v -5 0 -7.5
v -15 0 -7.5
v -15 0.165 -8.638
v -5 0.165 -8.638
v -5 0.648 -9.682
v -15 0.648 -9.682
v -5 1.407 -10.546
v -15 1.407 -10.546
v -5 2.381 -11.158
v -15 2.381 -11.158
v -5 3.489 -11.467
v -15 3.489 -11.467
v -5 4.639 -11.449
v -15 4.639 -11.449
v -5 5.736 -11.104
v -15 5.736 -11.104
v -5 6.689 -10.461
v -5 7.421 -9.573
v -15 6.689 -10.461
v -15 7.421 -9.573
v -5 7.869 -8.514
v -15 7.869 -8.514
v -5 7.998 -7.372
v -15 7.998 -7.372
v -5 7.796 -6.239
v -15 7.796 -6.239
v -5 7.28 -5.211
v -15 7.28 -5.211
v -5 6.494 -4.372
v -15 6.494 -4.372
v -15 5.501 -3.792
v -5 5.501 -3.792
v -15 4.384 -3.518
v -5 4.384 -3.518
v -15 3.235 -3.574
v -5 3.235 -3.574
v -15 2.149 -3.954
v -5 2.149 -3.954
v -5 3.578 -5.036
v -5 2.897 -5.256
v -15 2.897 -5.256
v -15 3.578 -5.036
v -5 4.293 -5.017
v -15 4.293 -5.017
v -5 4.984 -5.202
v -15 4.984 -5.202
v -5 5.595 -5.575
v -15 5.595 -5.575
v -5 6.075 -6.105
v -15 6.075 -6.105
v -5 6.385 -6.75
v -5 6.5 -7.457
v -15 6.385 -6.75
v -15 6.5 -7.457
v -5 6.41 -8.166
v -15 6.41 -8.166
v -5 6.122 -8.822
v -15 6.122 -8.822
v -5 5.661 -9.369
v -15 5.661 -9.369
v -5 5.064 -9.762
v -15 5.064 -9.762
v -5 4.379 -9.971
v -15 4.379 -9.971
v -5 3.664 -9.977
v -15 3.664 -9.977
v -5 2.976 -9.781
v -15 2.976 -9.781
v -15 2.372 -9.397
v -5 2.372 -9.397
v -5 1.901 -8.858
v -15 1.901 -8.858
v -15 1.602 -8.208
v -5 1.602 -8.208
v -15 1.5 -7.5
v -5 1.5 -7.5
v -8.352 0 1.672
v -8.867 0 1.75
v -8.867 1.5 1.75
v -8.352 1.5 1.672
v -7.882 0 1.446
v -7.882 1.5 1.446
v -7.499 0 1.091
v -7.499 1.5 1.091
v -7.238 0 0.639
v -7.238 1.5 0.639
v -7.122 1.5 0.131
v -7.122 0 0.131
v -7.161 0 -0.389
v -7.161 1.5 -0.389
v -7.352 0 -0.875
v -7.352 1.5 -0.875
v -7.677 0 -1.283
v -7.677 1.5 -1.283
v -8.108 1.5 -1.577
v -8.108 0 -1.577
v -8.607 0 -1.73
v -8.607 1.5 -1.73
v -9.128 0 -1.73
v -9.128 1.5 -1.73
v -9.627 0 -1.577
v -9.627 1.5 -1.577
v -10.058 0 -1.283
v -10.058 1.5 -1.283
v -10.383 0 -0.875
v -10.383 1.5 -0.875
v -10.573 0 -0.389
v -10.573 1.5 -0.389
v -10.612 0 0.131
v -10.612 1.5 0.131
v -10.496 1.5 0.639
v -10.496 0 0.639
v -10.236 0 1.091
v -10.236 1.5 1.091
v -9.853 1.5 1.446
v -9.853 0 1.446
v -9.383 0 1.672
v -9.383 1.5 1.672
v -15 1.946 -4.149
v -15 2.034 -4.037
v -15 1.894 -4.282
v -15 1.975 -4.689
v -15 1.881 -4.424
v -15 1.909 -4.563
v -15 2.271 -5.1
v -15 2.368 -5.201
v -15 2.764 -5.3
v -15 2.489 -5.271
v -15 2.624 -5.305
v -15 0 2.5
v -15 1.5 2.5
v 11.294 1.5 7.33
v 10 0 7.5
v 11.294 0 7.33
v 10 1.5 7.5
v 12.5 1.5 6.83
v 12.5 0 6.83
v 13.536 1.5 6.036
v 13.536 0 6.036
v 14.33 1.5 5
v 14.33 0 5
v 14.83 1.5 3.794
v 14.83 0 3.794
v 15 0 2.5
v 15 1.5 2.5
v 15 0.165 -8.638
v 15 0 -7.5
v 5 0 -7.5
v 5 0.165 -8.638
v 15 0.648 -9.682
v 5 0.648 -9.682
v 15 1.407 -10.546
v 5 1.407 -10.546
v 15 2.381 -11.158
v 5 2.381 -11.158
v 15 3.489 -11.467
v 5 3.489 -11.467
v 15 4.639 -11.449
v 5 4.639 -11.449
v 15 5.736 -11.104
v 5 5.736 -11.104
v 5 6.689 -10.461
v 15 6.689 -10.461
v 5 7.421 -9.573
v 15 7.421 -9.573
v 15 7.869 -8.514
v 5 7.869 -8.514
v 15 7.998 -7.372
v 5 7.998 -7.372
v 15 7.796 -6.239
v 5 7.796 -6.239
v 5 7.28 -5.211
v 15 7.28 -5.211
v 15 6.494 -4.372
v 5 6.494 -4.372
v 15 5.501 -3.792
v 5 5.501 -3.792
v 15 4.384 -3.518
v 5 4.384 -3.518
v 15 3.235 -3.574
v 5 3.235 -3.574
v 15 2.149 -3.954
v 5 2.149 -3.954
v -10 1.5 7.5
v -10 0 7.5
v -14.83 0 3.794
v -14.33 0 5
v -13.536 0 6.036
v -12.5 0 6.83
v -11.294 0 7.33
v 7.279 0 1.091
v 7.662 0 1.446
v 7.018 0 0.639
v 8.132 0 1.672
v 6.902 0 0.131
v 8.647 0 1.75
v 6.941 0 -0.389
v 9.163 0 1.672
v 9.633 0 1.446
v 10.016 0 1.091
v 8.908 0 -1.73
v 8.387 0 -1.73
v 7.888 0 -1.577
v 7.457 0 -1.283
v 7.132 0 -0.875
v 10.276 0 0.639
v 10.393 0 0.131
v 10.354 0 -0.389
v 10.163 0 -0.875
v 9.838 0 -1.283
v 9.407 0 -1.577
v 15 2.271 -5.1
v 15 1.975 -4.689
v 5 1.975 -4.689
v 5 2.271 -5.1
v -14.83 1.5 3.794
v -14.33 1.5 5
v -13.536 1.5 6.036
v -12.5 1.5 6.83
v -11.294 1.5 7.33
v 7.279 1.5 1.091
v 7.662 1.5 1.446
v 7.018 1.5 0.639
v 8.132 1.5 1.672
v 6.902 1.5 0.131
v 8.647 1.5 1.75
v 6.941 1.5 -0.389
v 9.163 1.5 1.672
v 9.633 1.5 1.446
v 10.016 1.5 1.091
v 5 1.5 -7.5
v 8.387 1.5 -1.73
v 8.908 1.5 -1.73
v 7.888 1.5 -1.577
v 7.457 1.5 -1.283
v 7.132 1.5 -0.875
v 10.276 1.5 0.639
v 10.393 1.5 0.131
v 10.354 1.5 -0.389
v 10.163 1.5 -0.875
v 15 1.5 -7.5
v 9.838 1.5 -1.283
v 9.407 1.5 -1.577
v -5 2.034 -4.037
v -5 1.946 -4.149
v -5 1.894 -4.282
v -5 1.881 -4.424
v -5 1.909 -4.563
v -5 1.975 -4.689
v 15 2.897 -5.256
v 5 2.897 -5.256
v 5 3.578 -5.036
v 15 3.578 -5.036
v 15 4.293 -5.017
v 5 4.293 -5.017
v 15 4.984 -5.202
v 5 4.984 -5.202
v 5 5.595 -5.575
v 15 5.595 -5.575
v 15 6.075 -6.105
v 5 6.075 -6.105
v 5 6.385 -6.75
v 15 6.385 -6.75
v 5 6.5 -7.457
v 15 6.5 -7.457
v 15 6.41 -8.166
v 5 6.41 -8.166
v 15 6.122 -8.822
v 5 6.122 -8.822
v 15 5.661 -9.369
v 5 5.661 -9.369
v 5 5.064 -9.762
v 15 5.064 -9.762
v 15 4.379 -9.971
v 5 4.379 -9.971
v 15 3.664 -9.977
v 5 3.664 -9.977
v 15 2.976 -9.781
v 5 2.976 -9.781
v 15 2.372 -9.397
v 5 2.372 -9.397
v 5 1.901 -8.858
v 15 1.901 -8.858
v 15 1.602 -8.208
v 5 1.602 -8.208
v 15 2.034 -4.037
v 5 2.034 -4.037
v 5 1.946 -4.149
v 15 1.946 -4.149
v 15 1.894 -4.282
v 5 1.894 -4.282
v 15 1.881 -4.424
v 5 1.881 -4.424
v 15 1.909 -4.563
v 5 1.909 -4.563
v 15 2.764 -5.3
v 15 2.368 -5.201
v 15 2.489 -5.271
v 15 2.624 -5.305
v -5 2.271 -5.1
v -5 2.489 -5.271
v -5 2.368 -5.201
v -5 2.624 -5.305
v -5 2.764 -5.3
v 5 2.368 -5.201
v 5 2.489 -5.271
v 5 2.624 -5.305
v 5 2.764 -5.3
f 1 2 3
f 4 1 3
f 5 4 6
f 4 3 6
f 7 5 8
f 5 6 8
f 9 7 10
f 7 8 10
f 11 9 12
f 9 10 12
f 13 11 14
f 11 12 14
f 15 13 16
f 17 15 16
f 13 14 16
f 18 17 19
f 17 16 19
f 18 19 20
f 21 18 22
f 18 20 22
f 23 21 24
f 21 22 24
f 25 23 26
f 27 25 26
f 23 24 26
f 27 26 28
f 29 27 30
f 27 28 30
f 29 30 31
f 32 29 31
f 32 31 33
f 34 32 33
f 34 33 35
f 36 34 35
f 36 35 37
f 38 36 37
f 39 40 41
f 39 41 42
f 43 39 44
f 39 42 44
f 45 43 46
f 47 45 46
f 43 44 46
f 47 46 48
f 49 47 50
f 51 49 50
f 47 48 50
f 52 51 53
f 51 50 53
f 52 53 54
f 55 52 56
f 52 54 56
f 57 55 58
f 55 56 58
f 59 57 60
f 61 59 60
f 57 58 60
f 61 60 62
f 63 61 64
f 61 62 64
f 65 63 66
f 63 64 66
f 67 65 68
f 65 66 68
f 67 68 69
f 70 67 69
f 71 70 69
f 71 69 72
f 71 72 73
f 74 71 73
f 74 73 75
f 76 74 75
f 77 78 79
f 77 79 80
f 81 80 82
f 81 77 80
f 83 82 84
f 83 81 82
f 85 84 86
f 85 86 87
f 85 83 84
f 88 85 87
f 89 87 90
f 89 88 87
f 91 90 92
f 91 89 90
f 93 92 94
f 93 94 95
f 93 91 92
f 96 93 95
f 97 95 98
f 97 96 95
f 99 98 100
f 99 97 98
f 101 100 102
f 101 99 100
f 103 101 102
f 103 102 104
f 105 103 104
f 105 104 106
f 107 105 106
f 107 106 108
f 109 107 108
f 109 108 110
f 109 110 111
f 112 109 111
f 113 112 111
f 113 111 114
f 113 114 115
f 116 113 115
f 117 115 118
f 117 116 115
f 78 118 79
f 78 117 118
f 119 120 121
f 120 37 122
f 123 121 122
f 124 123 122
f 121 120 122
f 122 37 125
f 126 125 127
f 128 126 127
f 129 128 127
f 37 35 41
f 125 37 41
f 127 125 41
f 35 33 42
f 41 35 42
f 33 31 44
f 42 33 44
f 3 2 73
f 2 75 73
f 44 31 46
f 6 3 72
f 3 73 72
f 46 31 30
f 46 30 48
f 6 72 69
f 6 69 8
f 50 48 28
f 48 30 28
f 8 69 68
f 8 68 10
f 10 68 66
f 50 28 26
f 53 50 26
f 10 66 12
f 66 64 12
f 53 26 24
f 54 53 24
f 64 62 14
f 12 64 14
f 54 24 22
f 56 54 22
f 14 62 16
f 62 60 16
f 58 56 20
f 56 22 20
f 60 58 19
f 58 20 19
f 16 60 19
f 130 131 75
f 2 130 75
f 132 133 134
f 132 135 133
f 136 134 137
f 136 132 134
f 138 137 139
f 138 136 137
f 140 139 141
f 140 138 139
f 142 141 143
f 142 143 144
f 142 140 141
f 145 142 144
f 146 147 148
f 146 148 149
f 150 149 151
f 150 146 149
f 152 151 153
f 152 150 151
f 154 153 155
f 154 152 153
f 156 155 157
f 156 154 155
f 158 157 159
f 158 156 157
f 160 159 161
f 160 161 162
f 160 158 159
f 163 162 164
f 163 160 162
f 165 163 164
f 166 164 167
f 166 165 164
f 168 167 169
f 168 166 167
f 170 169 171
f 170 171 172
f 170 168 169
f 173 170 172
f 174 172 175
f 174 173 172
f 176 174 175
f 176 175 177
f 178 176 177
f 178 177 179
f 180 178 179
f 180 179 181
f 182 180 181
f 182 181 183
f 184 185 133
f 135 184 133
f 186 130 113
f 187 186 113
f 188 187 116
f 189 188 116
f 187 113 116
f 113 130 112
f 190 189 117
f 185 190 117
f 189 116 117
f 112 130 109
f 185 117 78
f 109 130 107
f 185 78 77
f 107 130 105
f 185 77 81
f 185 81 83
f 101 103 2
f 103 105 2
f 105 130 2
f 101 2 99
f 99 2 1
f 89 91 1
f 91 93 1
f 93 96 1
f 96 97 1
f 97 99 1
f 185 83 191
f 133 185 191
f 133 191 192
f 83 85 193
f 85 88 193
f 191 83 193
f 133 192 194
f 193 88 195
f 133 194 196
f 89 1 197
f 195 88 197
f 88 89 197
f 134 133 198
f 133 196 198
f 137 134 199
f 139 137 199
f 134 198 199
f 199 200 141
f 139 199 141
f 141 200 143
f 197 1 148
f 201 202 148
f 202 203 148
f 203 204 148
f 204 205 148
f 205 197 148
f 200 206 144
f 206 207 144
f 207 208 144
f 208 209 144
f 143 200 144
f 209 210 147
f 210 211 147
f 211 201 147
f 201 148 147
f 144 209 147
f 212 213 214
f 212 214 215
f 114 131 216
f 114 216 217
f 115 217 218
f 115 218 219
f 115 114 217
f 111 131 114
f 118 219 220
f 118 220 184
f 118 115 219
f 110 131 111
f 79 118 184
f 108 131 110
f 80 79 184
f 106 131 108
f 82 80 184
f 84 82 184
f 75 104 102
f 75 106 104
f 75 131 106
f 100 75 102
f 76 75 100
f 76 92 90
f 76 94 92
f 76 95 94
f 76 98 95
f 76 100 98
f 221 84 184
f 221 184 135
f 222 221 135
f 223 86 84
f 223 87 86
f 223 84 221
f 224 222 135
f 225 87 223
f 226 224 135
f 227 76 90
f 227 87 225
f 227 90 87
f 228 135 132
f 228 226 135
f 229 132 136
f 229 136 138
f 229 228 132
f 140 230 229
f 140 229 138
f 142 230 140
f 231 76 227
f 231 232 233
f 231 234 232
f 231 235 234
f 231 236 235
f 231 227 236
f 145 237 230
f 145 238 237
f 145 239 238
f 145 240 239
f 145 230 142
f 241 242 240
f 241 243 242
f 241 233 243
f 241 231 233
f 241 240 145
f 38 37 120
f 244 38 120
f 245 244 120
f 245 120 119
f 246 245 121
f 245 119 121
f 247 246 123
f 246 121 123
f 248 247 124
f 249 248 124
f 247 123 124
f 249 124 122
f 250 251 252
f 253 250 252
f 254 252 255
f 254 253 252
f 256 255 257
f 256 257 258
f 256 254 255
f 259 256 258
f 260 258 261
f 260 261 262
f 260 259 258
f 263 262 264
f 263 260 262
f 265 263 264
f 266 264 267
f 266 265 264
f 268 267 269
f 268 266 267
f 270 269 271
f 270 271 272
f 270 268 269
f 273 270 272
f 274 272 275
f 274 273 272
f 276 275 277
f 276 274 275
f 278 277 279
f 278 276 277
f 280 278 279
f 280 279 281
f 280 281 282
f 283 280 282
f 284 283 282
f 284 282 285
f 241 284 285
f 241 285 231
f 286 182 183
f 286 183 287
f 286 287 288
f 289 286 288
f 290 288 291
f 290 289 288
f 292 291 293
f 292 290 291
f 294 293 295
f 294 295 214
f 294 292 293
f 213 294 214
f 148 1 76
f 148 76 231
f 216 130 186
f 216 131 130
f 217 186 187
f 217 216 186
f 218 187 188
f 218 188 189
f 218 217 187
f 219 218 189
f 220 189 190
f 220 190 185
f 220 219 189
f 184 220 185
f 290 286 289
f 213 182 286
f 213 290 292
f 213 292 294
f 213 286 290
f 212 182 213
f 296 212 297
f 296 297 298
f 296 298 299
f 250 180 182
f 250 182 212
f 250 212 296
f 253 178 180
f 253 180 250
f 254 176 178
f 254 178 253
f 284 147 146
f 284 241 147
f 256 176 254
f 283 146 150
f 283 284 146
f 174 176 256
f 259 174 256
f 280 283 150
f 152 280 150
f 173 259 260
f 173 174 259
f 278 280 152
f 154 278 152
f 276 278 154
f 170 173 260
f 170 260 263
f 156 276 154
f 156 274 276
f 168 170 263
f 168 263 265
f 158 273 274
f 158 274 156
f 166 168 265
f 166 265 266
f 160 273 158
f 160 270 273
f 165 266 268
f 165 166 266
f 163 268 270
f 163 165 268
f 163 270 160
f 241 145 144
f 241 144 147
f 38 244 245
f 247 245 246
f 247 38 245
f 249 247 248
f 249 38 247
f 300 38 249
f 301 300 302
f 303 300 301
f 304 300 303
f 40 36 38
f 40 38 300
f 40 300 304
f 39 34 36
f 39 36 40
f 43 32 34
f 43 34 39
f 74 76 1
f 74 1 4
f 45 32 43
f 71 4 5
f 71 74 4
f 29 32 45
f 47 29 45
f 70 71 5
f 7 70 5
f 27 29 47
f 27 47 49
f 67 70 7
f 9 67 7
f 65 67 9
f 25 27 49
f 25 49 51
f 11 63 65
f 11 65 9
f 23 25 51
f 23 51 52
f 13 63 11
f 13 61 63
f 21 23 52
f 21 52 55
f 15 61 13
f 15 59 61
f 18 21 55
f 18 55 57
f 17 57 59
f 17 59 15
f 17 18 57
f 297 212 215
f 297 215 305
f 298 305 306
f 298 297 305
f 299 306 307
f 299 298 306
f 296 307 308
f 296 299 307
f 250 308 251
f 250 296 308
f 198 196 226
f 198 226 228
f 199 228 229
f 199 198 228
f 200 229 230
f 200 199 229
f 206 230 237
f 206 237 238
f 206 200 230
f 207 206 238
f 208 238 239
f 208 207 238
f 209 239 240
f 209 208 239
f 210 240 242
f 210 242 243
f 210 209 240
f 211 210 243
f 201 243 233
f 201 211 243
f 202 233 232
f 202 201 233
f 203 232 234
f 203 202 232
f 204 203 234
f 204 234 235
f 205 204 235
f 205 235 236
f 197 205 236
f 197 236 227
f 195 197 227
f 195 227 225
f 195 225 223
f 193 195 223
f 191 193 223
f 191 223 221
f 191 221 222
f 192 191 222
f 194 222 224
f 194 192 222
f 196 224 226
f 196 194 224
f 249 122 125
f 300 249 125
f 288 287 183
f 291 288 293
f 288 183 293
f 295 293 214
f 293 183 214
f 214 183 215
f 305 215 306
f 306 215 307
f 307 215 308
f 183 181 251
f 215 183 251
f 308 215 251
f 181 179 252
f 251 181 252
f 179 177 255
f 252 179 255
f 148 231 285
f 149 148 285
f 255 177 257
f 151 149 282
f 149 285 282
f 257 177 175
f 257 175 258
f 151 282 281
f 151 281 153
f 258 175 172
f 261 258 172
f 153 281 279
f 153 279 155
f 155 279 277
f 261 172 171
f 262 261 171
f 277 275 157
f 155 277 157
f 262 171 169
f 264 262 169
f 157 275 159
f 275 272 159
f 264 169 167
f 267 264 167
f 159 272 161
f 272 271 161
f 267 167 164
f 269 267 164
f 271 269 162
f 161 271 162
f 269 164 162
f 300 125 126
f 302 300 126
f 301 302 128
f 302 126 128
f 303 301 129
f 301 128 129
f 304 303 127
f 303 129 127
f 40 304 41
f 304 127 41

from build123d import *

# Parameters (mm, degrees)
SKETCH_1_W      = 30
SKETCH_1_H      = 15
SKETCH_1_R      = 1.75
EXTRUDE_1_DEPTH = 1.5
FILLET_1_R      = 5
EXTRUDE_2_DEPTH = 10


with BuildPart() as part:
    # 草图1 → 凸台-拉伸1 (new body)
    with BuildSketch(Plane(origin=(0, 0, 0), x_dir=(1, 0, 0), z_dir=(0, 1, 0))):
        Rectangle(SKETCH_1_W, SKETCH_1_H)
        with Locations(Location((-8.867330988, 0, 0), (0, 0, 270))):
            Circle(SKETCH_1_R, mode=Mode.SUBTRACT)
        with Locations(Location((8.647397187, 0, 0), (0, 0, 270))):
            Circle(SKETCH_1_R, mode=Mode.SUBTRACT)
    extrude(amount=EXTRUDE_1_DEPTH)

    # 圆角1
    fillet_1_edges = [part.edges().sort_by_distance(p)[0] for p in [
        (-15, 0.75, 7.5),
        (15, 0.75, 7.5),
    ]]
    fillet(fillet_1_edges, radius=FILLET_1_R)

    # 草图2 → 凸台-拉伸2 (add)
    with BuildSketch(Plane(origin=(15, 0, 0), x_dir=(0, 0, -1), z_dir=(1, 0, 0))):
        with BuildLine():
            Line((7.5, 1.5), (7.5, 0))
            ThreePointArc((7.5, 0), (9.573370103, 7.420692388), (3.953819335, 2.149431792))
            ThreePointArc((3.953819335, 2.149431792), (4.281764154, 1.894235083), (4.689365013, 1.975072601))
            Line((4.689365013, 1.975072601), (5.099963472, 2.270889054))
            ThreePointArc((5.099963472, 2.270889054), (5.292783095, 2.555387358), (5.256408648, 2.897141058))
            ThreePointArc((5.256408648, 2.897141058), (8.821524242, 6.1221625), (7.5, 1.5))
        make_face()
    extrude_2 = extrude(amount=-EXTRUDE_2_DEPTH)

    # 镜向1: 凸台-拉伸2 across plane
    add(extrude_2.mirror(Plane(origin=(0, 0, 0), x_dir=(0, 0, 1), z_dir=(1, 0, 0))))


solid = part.part
